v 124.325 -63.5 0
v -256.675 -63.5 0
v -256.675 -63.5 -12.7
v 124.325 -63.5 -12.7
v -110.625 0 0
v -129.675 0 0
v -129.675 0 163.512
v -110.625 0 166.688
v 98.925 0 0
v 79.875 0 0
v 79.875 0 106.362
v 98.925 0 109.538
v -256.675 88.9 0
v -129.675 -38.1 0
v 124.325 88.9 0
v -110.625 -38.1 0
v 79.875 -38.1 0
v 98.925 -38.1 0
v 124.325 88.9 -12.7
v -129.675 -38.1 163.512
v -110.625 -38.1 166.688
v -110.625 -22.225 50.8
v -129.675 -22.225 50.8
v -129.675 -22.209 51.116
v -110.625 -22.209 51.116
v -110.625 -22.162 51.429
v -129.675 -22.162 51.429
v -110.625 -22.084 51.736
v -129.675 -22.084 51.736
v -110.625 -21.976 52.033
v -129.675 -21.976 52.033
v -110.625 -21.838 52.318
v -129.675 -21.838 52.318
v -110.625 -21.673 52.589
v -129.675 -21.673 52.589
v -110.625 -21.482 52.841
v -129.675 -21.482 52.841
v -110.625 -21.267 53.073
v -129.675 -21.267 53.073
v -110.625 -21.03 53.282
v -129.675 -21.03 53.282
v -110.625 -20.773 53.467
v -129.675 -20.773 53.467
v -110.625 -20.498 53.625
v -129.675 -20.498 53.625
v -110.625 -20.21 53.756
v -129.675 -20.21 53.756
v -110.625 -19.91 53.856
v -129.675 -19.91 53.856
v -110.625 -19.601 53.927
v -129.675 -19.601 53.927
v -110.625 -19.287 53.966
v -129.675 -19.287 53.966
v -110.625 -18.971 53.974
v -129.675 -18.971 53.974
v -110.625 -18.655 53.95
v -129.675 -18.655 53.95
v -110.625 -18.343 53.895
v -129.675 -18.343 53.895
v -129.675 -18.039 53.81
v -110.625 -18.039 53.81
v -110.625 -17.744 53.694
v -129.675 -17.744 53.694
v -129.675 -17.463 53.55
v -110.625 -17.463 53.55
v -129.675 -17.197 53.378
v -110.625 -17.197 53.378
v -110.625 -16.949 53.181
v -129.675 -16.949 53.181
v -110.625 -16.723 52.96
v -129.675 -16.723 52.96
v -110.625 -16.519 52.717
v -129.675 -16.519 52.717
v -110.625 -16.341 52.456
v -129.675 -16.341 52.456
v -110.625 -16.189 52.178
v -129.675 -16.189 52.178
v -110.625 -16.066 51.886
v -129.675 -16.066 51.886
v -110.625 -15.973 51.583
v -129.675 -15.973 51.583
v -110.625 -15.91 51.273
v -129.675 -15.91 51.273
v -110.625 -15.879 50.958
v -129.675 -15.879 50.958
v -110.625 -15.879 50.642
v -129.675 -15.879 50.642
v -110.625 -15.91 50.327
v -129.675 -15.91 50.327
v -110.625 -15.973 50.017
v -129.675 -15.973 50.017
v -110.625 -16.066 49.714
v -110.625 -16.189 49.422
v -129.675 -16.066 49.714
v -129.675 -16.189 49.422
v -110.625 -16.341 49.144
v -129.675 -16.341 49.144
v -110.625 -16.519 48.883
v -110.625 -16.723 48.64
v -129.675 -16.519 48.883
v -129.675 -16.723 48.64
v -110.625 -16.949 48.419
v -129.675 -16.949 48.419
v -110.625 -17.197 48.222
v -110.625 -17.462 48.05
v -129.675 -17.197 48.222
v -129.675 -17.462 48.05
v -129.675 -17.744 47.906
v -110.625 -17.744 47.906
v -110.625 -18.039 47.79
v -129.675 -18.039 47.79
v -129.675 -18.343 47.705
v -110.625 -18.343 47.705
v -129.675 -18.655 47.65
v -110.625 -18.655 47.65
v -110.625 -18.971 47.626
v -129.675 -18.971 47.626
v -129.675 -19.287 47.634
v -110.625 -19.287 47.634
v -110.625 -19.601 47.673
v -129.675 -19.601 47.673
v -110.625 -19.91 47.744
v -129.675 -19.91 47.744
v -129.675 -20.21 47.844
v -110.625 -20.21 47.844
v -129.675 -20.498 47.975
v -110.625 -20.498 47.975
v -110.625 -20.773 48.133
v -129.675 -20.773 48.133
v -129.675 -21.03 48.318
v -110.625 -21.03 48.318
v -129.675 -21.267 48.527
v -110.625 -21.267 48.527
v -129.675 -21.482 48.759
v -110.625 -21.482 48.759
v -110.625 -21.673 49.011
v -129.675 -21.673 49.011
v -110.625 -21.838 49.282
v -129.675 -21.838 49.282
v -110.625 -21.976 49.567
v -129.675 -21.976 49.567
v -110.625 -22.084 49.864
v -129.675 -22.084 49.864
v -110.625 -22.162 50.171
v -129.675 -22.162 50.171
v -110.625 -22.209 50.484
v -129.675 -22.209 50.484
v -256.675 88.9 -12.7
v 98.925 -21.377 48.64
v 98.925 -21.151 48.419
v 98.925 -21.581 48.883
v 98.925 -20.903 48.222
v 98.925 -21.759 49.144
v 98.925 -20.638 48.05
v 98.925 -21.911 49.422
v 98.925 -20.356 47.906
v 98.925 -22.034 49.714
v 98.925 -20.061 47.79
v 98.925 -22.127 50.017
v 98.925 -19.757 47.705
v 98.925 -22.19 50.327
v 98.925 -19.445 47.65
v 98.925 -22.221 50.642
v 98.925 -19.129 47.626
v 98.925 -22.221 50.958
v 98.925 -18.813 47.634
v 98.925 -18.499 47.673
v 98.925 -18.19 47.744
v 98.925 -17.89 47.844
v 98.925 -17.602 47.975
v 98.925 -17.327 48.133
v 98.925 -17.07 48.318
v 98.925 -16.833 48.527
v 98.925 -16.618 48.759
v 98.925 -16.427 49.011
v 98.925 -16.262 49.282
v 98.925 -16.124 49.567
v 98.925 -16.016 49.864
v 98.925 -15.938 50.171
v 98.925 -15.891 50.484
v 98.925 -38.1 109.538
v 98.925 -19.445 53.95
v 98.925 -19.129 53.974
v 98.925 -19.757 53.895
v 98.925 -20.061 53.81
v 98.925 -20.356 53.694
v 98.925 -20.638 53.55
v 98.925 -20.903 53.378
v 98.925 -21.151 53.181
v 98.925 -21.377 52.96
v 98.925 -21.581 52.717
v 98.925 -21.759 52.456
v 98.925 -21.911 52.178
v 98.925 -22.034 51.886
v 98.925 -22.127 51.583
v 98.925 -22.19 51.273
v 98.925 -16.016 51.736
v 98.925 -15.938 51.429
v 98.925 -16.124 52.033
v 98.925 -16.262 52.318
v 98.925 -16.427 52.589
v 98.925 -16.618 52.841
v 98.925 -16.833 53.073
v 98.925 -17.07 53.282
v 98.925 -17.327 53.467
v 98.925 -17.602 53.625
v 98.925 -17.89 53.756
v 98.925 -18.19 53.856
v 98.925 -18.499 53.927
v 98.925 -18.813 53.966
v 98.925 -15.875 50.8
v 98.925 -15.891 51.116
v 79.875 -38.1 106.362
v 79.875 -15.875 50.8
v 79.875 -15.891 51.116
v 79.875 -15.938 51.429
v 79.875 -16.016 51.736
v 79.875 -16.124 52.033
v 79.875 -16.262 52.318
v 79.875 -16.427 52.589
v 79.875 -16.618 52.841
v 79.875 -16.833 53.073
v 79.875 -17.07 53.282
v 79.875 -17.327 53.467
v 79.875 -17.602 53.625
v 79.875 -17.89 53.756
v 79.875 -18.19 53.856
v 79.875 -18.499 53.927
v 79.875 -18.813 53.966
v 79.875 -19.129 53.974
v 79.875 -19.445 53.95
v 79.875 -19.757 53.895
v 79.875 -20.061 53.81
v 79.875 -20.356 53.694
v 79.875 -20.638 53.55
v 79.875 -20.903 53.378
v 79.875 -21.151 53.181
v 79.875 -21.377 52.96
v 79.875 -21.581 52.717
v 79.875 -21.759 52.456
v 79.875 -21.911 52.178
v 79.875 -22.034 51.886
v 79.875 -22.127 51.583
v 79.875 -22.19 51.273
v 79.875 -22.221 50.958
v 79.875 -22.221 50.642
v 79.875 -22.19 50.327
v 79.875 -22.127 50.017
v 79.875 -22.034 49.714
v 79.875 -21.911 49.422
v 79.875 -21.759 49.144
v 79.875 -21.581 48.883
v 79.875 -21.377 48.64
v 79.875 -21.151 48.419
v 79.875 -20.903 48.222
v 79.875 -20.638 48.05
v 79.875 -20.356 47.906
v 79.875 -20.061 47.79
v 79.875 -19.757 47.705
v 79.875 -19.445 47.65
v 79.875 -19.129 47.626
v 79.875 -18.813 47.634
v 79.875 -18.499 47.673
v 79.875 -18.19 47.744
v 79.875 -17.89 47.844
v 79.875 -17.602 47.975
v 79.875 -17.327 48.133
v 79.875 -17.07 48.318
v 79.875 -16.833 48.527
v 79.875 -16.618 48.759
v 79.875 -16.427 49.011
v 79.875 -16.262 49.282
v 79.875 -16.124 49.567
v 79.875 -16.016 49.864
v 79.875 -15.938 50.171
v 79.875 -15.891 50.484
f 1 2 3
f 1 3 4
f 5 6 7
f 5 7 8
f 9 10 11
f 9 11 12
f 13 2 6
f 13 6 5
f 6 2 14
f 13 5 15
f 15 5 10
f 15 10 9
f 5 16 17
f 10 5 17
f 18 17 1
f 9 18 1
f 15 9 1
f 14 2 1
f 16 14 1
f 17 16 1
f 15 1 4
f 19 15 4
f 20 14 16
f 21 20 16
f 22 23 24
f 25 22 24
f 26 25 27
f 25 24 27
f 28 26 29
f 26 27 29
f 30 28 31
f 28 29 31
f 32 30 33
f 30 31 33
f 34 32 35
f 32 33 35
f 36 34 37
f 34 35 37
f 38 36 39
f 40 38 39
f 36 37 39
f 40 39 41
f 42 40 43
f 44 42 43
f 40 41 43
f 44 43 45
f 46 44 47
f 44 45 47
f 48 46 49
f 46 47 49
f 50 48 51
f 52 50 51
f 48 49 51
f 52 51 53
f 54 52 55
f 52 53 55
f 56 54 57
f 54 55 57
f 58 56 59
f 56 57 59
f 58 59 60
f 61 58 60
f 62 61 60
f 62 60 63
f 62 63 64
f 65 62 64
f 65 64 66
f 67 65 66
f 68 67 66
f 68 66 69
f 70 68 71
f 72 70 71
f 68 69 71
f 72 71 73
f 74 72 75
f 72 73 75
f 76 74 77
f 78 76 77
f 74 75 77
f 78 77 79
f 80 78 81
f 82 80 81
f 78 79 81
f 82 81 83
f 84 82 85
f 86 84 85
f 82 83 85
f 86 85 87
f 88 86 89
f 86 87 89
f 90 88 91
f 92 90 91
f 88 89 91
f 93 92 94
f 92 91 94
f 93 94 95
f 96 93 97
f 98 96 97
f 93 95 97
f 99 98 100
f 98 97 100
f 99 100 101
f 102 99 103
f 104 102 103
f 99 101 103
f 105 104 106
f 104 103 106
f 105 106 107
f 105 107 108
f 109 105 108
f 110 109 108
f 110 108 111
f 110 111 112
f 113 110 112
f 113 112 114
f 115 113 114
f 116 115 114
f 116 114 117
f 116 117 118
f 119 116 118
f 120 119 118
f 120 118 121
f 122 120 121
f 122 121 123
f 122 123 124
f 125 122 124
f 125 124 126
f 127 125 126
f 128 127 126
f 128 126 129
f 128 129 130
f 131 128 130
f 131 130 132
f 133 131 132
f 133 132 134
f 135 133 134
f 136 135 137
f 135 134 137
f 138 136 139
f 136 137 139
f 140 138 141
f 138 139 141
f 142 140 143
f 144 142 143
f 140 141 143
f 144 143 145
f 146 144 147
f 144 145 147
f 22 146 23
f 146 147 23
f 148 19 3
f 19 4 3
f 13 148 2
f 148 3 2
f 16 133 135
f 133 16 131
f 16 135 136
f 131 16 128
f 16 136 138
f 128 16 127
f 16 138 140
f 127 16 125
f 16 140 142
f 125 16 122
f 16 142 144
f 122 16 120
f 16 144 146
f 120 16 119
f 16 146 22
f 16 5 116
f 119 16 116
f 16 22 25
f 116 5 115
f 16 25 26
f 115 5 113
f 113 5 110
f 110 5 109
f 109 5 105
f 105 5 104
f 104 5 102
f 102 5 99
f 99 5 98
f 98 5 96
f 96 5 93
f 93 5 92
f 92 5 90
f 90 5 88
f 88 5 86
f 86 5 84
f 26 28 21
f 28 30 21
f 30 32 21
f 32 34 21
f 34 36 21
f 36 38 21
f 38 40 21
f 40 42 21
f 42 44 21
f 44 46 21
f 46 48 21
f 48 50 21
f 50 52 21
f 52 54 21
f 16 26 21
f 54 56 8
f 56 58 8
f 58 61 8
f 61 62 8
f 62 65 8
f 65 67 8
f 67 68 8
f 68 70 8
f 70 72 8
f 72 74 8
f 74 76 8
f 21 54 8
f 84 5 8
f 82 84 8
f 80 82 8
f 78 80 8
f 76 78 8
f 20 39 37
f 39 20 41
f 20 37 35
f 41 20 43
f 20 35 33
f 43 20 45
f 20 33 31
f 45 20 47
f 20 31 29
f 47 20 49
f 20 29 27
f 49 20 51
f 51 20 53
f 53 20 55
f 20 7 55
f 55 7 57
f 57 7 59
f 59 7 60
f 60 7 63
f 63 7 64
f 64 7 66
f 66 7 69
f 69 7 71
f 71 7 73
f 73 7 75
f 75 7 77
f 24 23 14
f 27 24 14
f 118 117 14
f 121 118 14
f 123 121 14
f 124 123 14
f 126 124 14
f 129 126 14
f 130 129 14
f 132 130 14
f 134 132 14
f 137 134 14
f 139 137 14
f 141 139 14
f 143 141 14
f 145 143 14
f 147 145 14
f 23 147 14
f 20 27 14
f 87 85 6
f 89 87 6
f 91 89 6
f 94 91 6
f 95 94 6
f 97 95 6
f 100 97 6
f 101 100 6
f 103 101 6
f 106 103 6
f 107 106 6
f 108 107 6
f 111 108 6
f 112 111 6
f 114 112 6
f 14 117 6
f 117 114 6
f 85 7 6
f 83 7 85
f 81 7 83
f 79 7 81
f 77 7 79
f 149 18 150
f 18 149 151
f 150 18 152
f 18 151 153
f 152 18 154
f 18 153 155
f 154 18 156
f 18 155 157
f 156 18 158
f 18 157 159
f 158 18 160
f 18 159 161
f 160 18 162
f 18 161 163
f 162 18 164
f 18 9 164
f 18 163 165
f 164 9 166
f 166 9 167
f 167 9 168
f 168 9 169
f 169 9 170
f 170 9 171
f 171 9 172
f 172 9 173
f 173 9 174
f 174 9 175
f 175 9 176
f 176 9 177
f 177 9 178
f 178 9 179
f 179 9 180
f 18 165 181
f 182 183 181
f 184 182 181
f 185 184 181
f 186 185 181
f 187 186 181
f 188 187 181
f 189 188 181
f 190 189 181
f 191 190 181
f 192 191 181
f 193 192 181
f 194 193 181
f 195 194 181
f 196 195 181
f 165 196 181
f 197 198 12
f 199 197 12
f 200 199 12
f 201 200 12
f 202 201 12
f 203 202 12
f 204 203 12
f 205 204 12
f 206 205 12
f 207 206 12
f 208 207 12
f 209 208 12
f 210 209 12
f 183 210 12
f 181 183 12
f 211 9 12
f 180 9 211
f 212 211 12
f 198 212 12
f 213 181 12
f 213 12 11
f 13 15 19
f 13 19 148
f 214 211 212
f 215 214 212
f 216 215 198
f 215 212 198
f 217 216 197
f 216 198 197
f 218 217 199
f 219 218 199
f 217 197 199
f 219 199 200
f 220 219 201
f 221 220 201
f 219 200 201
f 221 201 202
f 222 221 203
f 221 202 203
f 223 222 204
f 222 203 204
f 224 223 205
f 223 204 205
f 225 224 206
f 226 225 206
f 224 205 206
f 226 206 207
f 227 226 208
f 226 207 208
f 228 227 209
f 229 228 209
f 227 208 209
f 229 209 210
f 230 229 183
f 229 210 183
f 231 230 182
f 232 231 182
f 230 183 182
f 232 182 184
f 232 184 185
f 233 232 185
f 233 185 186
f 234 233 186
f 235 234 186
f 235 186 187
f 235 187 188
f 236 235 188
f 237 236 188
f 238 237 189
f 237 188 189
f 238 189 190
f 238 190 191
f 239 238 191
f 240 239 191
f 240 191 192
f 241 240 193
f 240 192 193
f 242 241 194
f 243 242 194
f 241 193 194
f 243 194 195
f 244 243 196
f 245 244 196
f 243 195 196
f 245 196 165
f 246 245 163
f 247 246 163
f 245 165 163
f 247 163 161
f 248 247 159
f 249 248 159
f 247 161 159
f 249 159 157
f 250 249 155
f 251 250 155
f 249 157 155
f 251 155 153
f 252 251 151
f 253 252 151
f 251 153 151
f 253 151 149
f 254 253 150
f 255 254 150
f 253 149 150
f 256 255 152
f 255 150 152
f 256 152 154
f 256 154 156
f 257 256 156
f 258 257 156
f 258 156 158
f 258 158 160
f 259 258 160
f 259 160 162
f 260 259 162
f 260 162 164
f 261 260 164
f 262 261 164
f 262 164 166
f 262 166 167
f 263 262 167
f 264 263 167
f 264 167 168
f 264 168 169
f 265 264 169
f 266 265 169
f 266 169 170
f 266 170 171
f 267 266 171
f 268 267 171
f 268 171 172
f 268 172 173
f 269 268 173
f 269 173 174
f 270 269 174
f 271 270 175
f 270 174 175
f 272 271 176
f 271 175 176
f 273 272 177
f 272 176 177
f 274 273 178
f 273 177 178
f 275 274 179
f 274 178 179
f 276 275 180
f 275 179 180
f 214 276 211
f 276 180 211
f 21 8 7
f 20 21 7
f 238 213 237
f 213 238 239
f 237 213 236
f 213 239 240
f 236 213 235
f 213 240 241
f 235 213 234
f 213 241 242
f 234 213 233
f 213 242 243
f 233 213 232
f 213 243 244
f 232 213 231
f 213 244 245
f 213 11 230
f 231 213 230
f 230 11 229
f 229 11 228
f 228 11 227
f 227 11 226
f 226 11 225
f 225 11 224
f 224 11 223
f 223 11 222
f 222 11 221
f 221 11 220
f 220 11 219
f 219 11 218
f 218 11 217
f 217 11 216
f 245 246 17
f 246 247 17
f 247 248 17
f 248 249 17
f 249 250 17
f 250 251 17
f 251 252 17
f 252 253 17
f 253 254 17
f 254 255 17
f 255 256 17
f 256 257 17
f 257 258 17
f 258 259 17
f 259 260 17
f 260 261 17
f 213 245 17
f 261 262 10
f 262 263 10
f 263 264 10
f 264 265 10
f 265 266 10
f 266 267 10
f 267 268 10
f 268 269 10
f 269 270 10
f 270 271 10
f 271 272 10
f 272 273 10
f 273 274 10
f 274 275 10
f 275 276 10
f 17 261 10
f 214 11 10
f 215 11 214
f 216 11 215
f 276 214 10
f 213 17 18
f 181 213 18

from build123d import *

# Parameters (mm, degrees)
F1_DEPTH   = 38.1
F2_R       = 3.175
F1_FACE1_W = 38.1
F1_FACE1_H = 163.5125
F3_DEPTH   = 19.05
F4_R       = 3.175
F5_DEPTH   = 19.05
F7_DEPTH   = 25.4
F9_DEPTH   = 88.9


with BuildPart() as f1:
    # F0 (on Front) → F1 (new body)
    with BuildSketch(Plane.XZ):
        Polygon((79.8746063113, 106.3625), (79.8746063113, 0), (98.9246063113, 0), (98.9246063113, 109.5375), align=None)
        Polygon((98.9246063113, 0), (79.8746063113, 0), (-110.6253936887, 0), (-129.6753936887, 0), (-256.6753936887, 0), (-256.6753936887, -12.7), (124.3246063113, -12.7), (124.3246063113, 0), align=None)
        Polygon((-129.6753936887, 0), (-110.6253936887, 0), (-110.6253936887, 166.6875), (-129.6753936887, 163.5125), align=None)
    extrude(amount=F1_DEPTH)

    # F2 (on face) + F1_face1 (on face) → F3 (cut)
    with BuildSketch(Plane.YZ.offset(98.9246063113)):
        with Locations((-19.05, 50.8)):
            Circle(F2_R)
    with BuildSketch(Plane(origin=(-129.6753936887, -19.05, 81.75625), x_dir=(0, -1, 0), z_dir=(-1, 0, 0))):
        Rectangle(F1_FACE1_W, F1_FACE1_H)
    extrude(amount=-F3_DEPTH, dir=(1, 0, 0), mode=Mode.SUBTRACT)

    # F4 (on face) → F5 (cut)
    with BuildSketch(Plane(origin=(-129.6753936887, 0, 0), x_dir=(0, -1, 0), z_dir=(-1, 0, 0))):
        with Locations((19.05, 50.8)):
            Circle(F4_R)
    extrude(amount=-F5_DEPTH, mode=Mode.SUBTRACT)

    # F6 (on face) → F7 (join)
    with BuildSketch(Plane.XZ.offset(38.1)):
        Polygon((-129.6753936887, 0), (-256.6753936887, 0), (-256.6753936887, -12.7), (124.3246063113, -12.7), (124.3246063113, 0), (98.9246063113, 0), (79.8746063113, 0), (-110.6253936887, 0), align=None)
    extrude(amount=F7_DEPTH)

    # F8 (on face) → F9 (join)
    with BuildSketch(Plane(origin=(0, 0, 0), x_dir=(-1, 0, 0), z_dir=(0, 1, 0))):
        Polygon((-98.9246063113, 0), (-124.3246063113, 0), (-124.3246063113, -12.7), (256.6753936887, -12.7), (256.6753936887, 0), (129.6753936887, 0), (110.6253936887, 0), (-79.8746063113, 0), align=None)
    extrude(amount=F9_DEPTH)


solid = f1.part
